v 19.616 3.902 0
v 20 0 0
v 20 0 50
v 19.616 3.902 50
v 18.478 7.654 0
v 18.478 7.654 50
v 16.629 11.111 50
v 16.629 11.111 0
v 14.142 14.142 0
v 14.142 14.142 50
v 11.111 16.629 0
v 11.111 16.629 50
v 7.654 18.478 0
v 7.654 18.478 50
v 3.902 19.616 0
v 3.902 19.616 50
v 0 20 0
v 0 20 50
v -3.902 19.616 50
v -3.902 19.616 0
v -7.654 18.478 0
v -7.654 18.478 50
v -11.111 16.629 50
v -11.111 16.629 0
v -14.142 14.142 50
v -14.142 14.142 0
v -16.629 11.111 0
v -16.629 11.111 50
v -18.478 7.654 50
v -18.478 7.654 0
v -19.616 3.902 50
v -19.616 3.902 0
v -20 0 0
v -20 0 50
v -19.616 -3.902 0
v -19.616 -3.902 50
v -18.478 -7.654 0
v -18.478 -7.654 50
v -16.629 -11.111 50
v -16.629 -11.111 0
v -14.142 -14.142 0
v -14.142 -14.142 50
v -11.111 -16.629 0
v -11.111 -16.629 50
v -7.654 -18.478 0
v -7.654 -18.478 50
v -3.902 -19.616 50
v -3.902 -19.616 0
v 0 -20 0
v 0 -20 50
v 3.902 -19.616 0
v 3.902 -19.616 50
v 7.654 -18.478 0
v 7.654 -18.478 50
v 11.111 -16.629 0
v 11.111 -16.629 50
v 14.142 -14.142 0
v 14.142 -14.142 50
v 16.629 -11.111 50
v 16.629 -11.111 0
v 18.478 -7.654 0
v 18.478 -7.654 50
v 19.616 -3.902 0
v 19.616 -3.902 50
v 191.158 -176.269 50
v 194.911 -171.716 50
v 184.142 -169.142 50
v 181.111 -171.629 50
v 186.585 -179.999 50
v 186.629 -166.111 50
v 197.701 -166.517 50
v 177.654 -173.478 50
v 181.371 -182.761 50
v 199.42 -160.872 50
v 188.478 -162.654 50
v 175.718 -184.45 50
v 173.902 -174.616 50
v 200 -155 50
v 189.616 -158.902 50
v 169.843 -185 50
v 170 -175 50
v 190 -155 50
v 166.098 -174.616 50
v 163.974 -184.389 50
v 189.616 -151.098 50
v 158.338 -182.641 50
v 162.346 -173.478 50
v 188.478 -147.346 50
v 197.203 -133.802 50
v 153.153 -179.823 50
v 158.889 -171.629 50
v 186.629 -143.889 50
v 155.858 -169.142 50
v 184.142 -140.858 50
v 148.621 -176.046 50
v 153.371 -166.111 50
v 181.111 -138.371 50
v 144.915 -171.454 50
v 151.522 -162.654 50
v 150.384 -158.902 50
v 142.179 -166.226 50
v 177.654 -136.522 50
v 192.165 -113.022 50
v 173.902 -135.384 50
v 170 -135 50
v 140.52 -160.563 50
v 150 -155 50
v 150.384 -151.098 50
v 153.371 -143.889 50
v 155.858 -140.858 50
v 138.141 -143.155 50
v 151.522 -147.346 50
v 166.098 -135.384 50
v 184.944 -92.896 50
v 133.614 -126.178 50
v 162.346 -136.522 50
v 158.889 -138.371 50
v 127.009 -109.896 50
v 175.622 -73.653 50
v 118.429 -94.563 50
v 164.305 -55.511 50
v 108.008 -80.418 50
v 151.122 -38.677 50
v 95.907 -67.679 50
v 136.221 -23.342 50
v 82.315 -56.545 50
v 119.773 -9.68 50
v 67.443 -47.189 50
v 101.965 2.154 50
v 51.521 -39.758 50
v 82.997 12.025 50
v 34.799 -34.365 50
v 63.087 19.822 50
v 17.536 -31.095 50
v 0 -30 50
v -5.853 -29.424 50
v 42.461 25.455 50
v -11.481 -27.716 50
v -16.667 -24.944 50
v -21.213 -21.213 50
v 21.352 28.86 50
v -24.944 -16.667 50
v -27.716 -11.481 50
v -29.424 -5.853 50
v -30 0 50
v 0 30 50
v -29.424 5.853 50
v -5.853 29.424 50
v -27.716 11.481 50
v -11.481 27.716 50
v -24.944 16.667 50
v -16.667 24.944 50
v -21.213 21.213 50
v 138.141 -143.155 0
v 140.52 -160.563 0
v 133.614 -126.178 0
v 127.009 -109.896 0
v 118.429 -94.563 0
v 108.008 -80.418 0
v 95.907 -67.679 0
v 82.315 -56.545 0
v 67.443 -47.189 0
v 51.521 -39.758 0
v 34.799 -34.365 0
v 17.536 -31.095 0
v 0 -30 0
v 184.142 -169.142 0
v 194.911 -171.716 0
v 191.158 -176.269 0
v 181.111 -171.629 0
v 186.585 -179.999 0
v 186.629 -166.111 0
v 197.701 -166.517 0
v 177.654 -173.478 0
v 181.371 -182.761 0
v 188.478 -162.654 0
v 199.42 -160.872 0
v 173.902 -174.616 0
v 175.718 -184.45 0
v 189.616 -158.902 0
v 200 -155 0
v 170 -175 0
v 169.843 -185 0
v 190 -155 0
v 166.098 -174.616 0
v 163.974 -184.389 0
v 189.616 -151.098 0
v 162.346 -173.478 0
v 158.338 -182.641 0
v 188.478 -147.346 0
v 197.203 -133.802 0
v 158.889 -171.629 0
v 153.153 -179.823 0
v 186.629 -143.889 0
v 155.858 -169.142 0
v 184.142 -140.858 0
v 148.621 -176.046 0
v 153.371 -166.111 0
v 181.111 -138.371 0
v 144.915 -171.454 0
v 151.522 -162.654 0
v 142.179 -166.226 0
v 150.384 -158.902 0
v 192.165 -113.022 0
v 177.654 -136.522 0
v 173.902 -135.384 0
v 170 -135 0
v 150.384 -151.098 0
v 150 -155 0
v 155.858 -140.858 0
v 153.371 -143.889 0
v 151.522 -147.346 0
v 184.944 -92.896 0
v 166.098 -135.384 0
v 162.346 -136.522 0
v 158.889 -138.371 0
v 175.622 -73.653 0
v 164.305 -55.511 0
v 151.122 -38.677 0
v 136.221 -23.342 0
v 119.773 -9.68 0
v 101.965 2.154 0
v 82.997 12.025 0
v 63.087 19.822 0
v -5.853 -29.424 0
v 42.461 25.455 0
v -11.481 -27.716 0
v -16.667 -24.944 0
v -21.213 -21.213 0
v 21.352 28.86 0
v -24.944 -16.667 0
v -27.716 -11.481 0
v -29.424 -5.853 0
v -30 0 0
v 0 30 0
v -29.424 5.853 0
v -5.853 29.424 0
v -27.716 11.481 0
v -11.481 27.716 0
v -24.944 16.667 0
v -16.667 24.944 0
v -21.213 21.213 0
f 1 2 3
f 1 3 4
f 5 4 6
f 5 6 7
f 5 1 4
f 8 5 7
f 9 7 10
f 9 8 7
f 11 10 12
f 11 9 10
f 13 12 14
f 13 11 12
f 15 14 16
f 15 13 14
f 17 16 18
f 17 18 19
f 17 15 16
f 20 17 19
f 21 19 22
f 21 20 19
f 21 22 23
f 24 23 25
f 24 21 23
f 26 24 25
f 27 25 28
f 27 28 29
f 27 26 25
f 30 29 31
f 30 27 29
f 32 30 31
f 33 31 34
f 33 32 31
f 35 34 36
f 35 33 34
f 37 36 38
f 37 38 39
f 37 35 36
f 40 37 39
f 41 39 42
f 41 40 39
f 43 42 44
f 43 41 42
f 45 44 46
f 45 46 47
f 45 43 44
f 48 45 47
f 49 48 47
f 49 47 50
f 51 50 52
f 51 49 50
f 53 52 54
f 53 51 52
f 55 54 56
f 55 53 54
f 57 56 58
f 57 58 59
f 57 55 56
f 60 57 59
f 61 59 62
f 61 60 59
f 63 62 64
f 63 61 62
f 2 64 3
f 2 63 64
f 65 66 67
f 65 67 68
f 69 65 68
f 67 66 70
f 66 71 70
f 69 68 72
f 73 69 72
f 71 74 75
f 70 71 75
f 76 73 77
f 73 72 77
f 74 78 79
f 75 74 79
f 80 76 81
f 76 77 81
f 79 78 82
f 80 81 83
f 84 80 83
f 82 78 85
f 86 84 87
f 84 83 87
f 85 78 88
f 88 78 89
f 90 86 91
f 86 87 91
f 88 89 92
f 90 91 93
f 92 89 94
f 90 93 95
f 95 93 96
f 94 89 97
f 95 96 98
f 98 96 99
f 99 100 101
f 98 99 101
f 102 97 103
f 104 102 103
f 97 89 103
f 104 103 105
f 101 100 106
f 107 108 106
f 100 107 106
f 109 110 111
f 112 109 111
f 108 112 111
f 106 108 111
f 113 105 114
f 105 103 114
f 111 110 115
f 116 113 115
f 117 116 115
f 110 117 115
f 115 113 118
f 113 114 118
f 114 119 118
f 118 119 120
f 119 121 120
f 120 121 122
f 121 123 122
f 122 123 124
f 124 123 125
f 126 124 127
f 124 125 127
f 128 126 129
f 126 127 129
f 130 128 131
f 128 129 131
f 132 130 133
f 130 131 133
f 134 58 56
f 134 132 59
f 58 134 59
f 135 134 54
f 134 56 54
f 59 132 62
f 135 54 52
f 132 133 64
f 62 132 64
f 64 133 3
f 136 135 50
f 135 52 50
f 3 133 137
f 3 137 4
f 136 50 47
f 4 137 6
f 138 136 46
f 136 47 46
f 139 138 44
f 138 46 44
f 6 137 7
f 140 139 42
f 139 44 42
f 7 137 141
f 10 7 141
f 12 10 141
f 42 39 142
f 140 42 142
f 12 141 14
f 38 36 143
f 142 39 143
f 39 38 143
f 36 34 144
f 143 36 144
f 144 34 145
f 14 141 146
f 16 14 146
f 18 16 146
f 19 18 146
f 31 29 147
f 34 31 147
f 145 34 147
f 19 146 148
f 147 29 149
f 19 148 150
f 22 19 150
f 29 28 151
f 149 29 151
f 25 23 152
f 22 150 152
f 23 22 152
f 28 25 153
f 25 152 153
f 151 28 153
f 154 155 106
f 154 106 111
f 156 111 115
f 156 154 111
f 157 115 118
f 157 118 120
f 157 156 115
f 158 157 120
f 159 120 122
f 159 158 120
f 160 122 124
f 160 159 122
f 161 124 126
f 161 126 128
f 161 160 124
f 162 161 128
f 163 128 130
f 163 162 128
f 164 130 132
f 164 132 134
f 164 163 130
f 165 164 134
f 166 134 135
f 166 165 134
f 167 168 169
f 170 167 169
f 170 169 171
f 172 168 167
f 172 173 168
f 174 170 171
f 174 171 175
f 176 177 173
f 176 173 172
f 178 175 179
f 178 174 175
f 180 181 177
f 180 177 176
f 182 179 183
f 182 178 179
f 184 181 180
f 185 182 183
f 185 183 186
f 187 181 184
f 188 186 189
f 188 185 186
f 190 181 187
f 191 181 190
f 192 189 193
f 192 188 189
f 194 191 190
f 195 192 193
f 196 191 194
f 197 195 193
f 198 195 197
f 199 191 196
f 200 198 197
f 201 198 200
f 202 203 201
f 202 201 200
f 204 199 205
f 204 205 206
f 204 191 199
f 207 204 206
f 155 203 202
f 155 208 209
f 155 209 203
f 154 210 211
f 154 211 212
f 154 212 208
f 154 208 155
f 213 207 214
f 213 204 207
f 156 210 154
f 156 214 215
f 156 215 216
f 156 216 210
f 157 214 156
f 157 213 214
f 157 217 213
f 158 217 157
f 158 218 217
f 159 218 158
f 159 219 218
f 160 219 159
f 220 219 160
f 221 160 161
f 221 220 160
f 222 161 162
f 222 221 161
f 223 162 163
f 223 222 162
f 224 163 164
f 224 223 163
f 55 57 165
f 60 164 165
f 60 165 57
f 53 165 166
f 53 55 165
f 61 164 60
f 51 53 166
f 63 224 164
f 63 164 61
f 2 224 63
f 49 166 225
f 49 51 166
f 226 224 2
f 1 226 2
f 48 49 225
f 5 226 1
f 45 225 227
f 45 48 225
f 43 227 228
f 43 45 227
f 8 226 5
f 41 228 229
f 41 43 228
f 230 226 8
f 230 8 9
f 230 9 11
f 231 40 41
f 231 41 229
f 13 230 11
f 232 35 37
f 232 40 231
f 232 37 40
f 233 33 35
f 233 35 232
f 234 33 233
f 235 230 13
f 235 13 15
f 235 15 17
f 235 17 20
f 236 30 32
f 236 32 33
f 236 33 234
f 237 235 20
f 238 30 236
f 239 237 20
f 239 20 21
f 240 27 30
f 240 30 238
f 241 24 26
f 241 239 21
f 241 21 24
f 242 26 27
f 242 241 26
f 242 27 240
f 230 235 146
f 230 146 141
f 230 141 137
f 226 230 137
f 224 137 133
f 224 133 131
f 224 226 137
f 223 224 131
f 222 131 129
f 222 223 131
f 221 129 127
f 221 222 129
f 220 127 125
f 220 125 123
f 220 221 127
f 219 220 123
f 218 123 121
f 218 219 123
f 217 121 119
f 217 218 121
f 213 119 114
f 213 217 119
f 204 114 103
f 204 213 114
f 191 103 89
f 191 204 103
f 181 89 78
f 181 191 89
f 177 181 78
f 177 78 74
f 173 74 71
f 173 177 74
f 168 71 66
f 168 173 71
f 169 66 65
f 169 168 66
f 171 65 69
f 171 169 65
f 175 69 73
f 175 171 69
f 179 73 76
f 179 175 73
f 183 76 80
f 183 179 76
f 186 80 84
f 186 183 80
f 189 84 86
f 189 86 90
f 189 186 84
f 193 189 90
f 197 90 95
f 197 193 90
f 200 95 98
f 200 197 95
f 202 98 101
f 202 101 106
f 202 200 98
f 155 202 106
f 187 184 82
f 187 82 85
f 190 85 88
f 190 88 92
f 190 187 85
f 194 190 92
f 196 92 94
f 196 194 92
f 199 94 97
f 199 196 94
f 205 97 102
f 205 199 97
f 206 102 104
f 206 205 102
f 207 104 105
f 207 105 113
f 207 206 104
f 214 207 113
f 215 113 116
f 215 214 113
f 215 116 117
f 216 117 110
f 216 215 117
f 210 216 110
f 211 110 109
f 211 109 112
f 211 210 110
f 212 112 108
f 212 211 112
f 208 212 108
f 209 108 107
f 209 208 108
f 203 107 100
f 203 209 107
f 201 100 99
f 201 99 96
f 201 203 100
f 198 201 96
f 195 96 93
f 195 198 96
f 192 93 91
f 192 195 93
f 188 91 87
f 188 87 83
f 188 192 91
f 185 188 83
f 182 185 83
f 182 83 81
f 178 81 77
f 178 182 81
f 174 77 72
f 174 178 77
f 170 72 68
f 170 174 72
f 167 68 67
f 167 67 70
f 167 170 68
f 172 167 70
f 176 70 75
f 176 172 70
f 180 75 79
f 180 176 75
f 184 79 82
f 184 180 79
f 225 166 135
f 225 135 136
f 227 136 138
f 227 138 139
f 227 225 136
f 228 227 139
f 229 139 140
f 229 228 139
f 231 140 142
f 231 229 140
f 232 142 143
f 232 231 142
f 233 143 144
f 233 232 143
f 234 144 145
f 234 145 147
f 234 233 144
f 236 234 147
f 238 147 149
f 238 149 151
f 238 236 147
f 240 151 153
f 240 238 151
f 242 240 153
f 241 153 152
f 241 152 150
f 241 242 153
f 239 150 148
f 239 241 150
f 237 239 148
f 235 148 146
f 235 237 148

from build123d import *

# Parameters (mm, degrees)
CROQUIS1_R              = 20
SALIENTE_EXTRUIR1_DEPTH = 50


with BuildPart() as part:
    # Croquis1 → Saliente-Extruir1 (new body)
    with BuildSketch(Plane.XY):
        with BuildLine():
            ThreePointArc((140.520313479, -160.563100092), (95.907092551, -67.678686317), (0, -30))
            ThreePointArc((0, -30), (-30, 0), (0, 30))
            ThreePointArc((0, 30), (136.221327258, -23.341808369), (200, -155))
            ThreePointArc((200, -155), (172.793689709, -184.869638394), (140.520313479, -160.563100092))
        make_face()
        with Locations((170, -155)):
            Circle(CROQUIS1_R, mode=Mode.SUBTRACT)
        Circle(CROQUIS1_R, mode=Mode.SUBTRACT)
    extrude(amount=SALIENTE_EXTRUIR1_DEPTH)


solid = part.part
